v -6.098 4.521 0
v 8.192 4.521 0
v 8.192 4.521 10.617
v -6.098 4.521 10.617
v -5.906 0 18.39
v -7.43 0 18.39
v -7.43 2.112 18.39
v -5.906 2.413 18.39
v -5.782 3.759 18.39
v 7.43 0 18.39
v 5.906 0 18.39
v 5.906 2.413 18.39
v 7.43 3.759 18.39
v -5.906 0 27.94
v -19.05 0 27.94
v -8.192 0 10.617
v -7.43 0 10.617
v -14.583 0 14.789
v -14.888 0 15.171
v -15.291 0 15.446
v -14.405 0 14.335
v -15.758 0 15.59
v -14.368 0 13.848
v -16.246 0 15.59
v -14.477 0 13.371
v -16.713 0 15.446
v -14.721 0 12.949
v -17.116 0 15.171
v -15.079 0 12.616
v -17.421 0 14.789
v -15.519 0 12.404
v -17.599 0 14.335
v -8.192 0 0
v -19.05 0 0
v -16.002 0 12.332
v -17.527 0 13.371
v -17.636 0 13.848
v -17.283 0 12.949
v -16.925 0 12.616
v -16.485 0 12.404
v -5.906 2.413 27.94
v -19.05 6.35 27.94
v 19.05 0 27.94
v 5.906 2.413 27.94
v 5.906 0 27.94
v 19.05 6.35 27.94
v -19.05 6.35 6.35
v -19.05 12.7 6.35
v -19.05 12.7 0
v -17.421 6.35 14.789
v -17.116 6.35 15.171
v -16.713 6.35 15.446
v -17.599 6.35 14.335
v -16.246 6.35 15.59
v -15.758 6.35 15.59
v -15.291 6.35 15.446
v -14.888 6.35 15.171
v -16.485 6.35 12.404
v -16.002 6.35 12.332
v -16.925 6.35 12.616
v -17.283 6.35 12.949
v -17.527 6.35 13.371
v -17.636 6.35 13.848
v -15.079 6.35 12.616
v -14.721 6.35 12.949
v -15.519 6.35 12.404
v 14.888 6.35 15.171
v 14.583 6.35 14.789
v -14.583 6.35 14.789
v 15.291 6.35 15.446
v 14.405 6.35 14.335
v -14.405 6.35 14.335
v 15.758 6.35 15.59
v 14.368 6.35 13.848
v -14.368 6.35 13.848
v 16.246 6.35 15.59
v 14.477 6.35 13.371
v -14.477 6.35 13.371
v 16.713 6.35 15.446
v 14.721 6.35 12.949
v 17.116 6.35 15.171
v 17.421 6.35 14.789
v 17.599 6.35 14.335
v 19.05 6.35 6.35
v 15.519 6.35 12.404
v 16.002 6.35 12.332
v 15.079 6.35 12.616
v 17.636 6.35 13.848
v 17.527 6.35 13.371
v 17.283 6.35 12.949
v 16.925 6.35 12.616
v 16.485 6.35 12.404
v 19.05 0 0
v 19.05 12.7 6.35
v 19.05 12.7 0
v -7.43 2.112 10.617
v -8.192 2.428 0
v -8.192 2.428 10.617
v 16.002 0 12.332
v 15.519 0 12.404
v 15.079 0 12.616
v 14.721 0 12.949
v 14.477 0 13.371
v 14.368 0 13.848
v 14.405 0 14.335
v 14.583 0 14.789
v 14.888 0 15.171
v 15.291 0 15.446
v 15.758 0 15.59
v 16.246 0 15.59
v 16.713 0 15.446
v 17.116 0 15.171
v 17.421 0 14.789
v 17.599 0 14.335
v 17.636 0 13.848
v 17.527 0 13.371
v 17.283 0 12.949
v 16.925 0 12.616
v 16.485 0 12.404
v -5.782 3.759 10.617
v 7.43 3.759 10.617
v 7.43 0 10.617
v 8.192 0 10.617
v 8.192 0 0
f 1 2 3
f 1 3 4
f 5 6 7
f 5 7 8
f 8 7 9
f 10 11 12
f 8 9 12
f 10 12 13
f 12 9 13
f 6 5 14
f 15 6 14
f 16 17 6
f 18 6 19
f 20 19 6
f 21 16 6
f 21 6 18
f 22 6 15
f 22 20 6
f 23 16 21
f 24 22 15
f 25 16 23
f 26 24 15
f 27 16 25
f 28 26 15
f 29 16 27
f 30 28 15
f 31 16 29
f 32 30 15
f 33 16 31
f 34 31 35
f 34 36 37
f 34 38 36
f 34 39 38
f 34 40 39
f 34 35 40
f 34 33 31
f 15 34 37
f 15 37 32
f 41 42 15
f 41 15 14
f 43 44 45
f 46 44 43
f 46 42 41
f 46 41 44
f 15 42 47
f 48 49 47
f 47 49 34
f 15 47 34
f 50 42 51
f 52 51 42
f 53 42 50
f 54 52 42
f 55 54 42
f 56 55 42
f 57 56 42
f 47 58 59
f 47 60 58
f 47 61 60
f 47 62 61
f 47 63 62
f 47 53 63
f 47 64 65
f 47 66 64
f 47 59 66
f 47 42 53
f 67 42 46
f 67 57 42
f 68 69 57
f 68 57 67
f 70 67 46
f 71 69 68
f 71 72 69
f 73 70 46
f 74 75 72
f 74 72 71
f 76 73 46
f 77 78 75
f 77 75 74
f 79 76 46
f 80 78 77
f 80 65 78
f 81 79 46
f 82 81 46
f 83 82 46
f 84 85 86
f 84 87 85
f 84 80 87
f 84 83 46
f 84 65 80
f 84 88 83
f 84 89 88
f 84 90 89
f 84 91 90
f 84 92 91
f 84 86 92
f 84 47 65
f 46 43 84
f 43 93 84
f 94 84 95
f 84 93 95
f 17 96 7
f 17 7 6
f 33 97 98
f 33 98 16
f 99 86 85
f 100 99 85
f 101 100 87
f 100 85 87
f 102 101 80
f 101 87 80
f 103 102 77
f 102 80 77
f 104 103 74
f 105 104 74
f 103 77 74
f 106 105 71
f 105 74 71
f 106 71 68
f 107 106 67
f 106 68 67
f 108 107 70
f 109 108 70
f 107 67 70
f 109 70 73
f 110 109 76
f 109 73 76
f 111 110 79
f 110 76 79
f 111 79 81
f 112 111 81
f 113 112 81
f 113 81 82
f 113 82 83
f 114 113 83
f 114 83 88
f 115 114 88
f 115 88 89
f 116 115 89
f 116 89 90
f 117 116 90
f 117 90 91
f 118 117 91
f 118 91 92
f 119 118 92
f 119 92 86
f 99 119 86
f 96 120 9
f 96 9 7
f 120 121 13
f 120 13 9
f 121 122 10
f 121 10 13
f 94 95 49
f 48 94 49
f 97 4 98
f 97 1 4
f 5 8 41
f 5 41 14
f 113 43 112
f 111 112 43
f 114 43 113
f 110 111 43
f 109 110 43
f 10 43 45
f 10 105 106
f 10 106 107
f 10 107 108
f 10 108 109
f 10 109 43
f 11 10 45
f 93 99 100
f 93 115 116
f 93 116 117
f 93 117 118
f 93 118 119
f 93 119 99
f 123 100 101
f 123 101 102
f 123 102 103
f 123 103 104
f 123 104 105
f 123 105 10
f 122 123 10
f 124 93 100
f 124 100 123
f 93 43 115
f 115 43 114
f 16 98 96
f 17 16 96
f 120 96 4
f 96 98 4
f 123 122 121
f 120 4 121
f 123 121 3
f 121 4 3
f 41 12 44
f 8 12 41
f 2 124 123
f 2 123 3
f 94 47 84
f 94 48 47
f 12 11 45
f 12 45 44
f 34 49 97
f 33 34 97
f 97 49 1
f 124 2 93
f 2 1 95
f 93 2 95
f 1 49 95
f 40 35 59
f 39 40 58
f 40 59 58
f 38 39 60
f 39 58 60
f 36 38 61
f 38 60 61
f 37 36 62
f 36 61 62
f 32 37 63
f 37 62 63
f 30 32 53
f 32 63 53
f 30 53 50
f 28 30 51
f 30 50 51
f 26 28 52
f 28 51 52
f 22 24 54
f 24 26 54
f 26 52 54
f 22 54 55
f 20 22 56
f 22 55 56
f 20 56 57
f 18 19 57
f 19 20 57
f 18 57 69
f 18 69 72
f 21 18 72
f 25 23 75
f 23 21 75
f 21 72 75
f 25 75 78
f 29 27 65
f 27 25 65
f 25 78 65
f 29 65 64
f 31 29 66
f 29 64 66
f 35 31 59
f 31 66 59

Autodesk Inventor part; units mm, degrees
ref_plane "YZ Plane" through (0, 0, 0) normal (1, 0, 0) x (0, 1, 0)
ref_plane "XZ Plane" through (0, 0, 0) normal (0, 1, 0) x (-1, 0, 0)
ref_plane "XY Plane" through (0, 0, 0) normal (0, 0, 1) x (1, 0, 0)
sketch "XT60" plane through (0, 0, 0) normal (0, 0, 1) x (1, 0, 0)
  line L0 (-7.6835, 4.0132) -> (7.6835, 4.0132) construction
  line L1 (7.6835, 4.0132) -> (7.6835, -4.0132)
  line L2 (7.6835, -4.0132) -> (-7.6835, -4.0132) construction
  line L3 (-7.6835, -4.0132) -> (-7.6835, 4.0132) construction
  line L4 (-7.6835, 4.0132) -> (7.6835, -4.0132) construction
  line L5 (7.6835, 4.0132) -> (-7.6835, -4.0132) construction
  line L6 (-7.6835, 2.2171) -> (-5.8874, 4.0132)
  line L7 (-7.6835, 2.2171) -> (-5.1435, 2.2171) construction
  line L8 (-10.7569, 0) -> (10.7569, 0) projected
  line L9 (-7.6835, -2.2171) -> (-5.8874, -4.0132)
  line L10 (-7.6835, -2.2171) -> (-5.1435, -2.2171) construction
  line L11 (-7.6835, -2.2171) -> (-7.6835, 2.2171)
  line L12 (-5.8874, 4.0132) -> (7.6835, 4.0132)
  line L13 (7.6835, -4.0132) -> (-5.8874, -4.0132)
  point P0 (0, 0)
  dimension "d0" = 15.367
  dimension "d1" = 8.0264
  dimension "d2" = 2.54
  dimension "d3" = 45
  dimension "d4" = 2.54
  dimension "d5" = 45
sketch "Sketch2" plane through (0, 0, 0) normal (0, 0, 1) x (1, 0, 0)
  line L0 (-7.6835, 2.2171) -> (-5.8874, 4.0132) projected
  line L1 (-5.8874, 4.0132) -> (7.6835, 4.0132) projected
  line L2 (-7.6835, -2.2171) -> (-7.6835, 2.2171) projected
  line L3 (-7.6835, -2.2171) -> (-5.8874, -4.0132) projected
  line L4 (7.6835, -4.0132) -> (-5.8874, -4.0132) projected
  line L5 (7.6835, 4.0132) -> (7.6835, -4.0132) projected
  line L6 (8.1915, 4.5212) -> (-6.0979, 4.5212)
  line L7 (-6.0979, 4.5212) -> (-8.1915, 2.4276)
  line L8 (-8.1915, 2.4276) -> (-8.1915, -2.4276)
  line L9 (-8.1915, -2.4276) -> (-6.0979, -4.5212)
  line L10 (-6.0979, -4.5212) -> (8.1915, -4.5212)
  line L11 (8.1915, -4.5212) -> (8.1915, 4.5212)
  line L12 (7.4295, 3.7592) -> (-5.7822, 3.7592)
  line L13 (-5.7822, 3.7592) -> (-7.4295, 2.1119)
  line L14 (-7.4295, 2.1119) -> (-7.4295, -2.1119)
  line L15 (-7.4295, -2.1119) -> (-5.7822, -3.7592)
  line L16 (-5.7822, -3.7592) -> (7.4295, -3.7592)
  line L17 (7.4295, -3.7592) -> (7.4295, 3.7592)
  line L18 (-19.05, 6.35) -> (19.05, 6.35)
  line L19 (19.05, 6.35) -> (19.05, 0)
  line L20 (19.05, 0) -> (-19.05, 0)
  line L21 (-19.05, 0) -> (-19.05, 6.35)
  line L22 (-5.9055, -2.413) -> (5.9055, -2.413)
  line L23 (5.9055, -2.413) -> (5.9055, 2.413)
  line L24 (5.9055, 2.413) -> (-5.9055, 2.413)
  line L25 (-5.9055, 2.413) -> (-5.9055, -2.413)
  line L26 (-5.9055, -2.413) -> (5.9055, 2.413) construction
  line L27 (5.9055, -2.413) -> (-5.9055, 2.413) construction
  line L28 (-19.05, 6.35) -> (19.05, 6.35)
  line L29 (19.05, 6.35) -> (19.05, 12.7)
  line L30 (19.05, 12.7) -> (-19.05, 12.7)
  line L31 (-19.05, 12.7) -> (-19.05, 6.35)
  point P0 (0, 0)
  dimension "d6" = 0.254
  dimension "d7" = 0.508
  dimension "d8" = 38.1
  dimension "d9" = 6.35
  dimension "d25" = 11.811
  dimension "d26" = 4.826
  dimension "d29" = 6.35
extrude "Extrusion1" add sketch "Sketch2" along normal blind 27.94 contours L2 L20 L8 L7 L6 L11 L5 L1 L0 | L0 L1 L5 L20 L17 L12 L13 L14 L2 | L14 L13 L12 L17 L20 L23 L24 L25 | L20 L21 L18 L19 L11 L6 L7 L8 | L25 L24 L23 L20
extrude "Extrusion2" cut sketch "Sketch2" along normal blind 18.3896 contours L20 L25 L22 L23 L17 L16 L15 L14 | L14 L13 L12 L17 L20 L23 L24 L25 | L25 L24 L23 L20 | L20 L23 L22 L25
extrude "Extrusion3" cut sketch "Sketch2" along normal blind 10.6172 contours L2 L20 L8 L7 L6 L11 L5 L1 L0 | L0 L1 L5 L20 L17 L12 L13 L14 L2 | L20 L14 L15 L16 L17 L5 L4 L3 L2 | L2 L3 L4 L5 L20 L11 L10 L9 L8 | L20 L25 L22 L23 L17 L16 L15 L14 | L14 L13 L12 L17 L20 L23 L24 L25 | L25 L24 L23 L20 | L20 L23 L22 L25
sketch "Sketch3" plane through (0, 0, 0) normal (0, 1, 0) x (-1, 0, 0)
  point P0 (-16.002, 13.97)
  point P1 (0, 0)
  dimension "d16" = 16.002
  dimension "d17" = 13.97
hole "Hole1" at (16.002, 0, 13.97) direction (0, 1, 0) diameter 3.2766 end through all clearance for "Oval Head Machine Screw" size "#4" standard "Ansi Unified Screw Threads"
mirror "Mirror1" about plane through (0, 0, 0) normal (1, 0, 0) of "Hole1"
extrude "Extrusion4" cut sketch "Sketch2" along normal through all contours L25 L24 L23 L20 | L20 L23 L22 L25
extrude "Extrusion5" add sketch "Sketch2" along normal blind 6.35 contours L31 L30 L29 L18
properties part number "xt-60 holder"
